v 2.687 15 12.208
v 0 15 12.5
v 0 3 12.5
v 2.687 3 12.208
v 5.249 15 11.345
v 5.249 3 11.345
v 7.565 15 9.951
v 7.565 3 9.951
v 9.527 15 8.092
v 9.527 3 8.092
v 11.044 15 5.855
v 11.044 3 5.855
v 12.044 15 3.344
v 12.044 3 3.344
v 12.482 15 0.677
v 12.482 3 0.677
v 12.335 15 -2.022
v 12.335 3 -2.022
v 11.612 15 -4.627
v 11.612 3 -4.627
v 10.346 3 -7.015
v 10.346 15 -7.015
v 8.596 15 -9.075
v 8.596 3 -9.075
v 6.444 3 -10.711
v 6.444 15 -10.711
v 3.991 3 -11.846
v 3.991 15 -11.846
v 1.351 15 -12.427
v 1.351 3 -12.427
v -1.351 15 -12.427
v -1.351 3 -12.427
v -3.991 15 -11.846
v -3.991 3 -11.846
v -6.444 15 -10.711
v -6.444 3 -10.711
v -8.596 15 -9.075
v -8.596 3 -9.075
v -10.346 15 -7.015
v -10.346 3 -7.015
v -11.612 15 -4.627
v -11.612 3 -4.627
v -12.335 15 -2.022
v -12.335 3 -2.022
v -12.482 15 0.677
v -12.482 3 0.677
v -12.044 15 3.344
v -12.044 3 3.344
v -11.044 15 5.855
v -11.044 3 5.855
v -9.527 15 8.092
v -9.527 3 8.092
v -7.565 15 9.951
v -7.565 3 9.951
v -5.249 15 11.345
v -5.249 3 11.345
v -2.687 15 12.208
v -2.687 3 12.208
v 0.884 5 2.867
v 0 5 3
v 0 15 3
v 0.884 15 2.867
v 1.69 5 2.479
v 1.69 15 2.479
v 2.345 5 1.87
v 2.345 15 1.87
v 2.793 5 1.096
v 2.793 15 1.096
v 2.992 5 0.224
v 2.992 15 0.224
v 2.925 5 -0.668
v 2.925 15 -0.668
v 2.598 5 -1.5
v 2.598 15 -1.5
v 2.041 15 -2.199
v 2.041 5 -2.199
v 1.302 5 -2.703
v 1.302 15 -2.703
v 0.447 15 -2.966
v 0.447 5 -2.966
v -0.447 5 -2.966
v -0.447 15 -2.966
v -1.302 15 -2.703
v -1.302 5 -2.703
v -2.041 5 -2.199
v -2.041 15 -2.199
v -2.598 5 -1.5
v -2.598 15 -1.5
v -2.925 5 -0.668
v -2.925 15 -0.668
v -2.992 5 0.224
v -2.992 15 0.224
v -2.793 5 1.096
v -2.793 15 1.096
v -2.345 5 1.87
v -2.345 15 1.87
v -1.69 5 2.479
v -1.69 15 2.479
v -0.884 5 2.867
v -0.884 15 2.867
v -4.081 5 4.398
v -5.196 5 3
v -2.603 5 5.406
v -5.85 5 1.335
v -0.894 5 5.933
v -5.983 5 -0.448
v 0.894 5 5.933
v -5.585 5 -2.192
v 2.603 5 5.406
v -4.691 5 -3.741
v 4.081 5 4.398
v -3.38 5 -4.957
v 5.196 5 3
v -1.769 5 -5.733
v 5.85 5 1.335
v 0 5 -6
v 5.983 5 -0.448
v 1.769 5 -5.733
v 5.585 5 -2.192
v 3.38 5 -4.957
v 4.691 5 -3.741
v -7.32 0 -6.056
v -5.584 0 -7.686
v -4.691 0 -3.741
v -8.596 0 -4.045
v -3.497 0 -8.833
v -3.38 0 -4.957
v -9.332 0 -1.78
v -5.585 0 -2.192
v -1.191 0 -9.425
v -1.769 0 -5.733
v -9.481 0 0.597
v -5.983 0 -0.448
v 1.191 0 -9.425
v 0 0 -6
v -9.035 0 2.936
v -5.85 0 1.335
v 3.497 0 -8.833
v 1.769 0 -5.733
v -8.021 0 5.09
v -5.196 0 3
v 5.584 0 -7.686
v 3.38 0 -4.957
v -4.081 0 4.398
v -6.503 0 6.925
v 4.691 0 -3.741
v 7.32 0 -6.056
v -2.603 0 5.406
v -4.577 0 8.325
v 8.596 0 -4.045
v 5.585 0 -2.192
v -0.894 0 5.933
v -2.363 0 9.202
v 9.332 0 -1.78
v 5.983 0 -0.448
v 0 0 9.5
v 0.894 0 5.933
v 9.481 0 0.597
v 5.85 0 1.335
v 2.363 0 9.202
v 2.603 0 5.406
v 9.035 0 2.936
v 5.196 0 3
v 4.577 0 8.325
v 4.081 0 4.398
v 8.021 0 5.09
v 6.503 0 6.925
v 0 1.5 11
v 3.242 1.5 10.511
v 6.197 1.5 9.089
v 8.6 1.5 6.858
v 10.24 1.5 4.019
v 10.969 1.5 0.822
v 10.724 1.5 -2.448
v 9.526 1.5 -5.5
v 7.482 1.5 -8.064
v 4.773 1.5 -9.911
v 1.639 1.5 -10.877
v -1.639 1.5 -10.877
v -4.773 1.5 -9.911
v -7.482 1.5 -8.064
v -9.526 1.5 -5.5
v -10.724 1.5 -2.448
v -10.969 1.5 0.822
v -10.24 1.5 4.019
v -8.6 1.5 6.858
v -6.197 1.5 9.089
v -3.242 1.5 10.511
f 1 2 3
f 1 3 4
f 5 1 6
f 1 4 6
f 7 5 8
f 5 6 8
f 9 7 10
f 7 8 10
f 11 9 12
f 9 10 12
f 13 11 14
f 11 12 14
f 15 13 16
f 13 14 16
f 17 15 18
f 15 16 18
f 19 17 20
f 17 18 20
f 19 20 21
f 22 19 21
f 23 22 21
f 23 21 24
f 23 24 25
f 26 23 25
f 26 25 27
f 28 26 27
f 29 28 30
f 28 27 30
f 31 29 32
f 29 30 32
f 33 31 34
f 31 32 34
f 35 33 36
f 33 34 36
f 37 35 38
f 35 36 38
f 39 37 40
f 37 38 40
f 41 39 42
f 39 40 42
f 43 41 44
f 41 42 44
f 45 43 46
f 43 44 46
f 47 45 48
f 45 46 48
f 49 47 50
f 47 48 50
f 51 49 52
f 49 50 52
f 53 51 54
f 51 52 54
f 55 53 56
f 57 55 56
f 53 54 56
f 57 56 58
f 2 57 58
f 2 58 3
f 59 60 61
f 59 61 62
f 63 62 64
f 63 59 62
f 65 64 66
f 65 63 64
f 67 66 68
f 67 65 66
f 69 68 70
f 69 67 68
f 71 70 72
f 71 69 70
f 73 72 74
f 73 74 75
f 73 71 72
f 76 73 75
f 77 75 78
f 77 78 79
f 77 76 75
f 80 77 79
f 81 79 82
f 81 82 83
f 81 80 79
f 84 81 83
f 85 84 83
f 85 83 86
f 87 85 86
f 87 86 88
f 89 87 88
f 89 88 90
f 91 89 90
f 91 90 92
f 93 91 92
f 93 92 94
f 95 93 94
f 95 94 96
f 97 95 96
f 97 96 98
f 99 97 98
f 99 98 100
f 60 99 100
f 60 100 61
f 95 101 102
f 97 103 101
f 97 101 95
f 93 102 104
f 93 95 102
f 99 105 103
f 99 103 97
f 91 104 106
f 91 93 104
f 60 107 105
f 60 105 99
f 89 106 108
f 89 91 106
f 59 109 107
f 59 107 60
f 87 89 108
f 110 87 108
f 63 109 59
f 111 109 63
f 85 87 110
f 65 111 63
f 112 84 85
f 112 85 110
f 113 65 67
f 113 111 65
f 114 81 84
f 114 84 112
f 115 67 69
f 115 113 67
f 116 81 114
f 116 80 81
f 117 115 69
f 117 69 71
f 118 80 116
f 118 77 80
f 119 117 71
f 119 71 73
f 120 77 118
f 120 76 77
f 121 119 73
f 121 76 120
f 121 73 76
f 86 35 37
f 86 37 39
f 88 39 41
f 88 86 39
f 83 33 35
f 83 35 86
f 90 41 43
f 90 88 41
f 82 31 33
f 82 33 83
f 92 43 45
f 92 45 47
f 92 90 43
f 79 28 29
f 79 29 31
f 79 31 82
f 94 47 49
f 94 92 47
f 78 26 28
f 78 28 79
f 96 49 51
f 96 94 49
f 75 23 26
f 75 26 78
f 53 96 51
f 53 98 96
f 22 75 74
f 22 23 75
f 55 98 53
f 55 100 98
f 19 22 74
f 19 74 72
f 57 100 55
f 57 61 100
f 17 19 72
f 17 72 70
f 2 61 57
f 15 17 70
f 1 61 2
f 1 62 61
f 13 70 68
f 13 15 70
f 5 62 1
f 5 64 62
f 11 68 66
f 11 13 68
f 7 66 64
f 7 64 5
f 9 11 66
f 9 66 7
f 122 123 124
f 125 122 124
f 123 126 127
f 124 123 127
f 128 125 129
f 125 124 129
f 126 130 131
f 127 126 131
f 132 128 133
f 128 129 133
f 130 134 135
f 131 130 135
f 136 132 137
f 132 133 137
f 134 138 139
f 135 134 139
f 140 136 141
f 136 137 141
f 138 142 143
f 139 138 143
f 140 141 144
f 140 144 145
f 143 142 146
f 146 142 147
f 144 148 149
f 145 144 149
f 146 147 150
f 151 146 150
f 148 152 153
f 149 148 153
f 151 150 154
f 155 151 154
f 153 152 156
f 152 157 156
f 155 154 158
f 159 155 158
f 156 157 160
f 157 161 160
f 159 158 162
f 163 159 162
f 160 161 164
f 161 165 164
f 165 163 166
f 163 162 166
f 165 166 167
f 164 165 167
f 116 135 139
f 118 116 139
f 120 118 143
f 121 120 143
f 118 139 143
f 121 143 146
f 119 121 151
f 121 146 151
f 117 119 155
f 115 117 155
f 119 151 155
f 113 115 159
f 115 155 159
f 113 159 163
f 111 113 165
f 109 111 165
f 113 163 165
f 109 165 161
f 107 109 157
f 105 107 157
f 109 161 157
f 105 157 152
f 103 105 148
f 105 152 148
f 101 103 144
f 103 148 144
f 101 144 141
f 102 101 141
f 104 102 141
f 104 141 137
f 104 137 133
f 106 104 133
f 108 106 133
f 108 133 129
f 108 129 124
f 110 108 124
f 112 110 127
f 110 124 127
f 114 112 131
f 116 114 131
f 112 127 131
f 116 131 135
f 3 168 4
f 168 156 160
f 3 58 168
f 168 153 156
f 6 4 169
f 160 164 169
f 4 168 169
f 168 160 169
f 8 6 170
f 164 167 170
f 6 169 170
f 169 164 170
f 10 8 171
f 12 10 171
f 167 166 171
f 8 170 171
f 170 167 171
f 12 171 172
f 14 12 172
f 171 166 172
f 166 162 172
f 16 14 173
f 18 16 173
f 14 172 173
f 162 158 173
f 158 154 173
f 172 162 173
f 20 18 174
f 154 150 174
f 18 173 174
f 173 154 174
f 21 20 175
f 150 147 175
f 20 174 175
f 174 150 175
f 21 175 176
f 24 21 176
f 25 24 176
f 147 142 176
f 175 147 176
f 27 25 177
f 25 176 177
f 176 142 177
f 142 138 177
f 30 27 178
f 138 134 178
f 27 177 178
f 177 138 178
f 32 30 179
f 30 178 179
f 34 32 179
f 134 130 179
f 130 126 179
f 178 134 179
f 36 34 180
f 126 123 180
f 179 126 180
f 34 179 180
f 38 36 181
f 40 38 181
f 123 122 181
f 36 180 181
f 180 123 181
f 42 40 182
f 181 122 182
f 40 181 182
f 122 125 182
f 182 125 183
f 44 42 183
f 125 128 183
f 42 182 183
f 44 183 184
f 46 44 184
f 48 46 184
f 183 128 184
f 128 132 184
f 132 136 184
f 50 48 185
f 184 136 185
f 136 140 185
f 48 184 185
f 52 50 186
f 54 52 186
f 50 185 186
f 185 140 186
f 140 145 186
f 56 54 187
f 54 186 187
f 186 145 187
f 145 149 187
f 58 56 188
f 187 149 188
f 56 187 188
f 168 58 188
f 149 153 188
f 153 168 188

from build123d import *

# Parameters (mm, degrees)
SKETCH1_R           = 12.5
SKETCH1_R_2         = 3
BOSS_EXTRUDE1_DEPTH = 15
CHAMFER1_SIZE       = 3
SKETCH2_R           = 6
CUT_EXTRUDE1_DEPTH  = 5


with BuildPart() as part:
    # Sketch1 → Boss-Extrude1 (new body)
    with BuildSketch(Plane(origin=(0, 0, 0), x_dir=(1, 0, 0), z_dir=(0, 1, 0))):
        with Locations(Location((0, 0, 0), (0, 0, 270))):
            Circle(SKETCH1_R)
        with Locations(Location((0, 0, 0), (0, 0, 270))):
            Circle(SKETCH1_R_2, mode=Mode.SUBTRACT)
    extrude(amount=BOSS_EXTRUDE1_DEPTH)

    # Chamfer1
    chamfer1_edges = [part.edges().sort_by_distance(p)[0] for p in [
        (0, 0, -12.5),
    ]]
    chamfer(chamfer1_edges, length=CHAMFER1_SIZE)

    # Sketch2 → Cut-Extrude1 (cut)
    with BuildSketch(Plane.XZ):
        with Locations(Location((0, 0, 0), (0, 0, 270))):
            Circle(SKETCH2_R)
    extrude(amount=-CUT_EXTRUDE1_DEPTH, mode=Mode.SUBTRACT)


solid = part.part
